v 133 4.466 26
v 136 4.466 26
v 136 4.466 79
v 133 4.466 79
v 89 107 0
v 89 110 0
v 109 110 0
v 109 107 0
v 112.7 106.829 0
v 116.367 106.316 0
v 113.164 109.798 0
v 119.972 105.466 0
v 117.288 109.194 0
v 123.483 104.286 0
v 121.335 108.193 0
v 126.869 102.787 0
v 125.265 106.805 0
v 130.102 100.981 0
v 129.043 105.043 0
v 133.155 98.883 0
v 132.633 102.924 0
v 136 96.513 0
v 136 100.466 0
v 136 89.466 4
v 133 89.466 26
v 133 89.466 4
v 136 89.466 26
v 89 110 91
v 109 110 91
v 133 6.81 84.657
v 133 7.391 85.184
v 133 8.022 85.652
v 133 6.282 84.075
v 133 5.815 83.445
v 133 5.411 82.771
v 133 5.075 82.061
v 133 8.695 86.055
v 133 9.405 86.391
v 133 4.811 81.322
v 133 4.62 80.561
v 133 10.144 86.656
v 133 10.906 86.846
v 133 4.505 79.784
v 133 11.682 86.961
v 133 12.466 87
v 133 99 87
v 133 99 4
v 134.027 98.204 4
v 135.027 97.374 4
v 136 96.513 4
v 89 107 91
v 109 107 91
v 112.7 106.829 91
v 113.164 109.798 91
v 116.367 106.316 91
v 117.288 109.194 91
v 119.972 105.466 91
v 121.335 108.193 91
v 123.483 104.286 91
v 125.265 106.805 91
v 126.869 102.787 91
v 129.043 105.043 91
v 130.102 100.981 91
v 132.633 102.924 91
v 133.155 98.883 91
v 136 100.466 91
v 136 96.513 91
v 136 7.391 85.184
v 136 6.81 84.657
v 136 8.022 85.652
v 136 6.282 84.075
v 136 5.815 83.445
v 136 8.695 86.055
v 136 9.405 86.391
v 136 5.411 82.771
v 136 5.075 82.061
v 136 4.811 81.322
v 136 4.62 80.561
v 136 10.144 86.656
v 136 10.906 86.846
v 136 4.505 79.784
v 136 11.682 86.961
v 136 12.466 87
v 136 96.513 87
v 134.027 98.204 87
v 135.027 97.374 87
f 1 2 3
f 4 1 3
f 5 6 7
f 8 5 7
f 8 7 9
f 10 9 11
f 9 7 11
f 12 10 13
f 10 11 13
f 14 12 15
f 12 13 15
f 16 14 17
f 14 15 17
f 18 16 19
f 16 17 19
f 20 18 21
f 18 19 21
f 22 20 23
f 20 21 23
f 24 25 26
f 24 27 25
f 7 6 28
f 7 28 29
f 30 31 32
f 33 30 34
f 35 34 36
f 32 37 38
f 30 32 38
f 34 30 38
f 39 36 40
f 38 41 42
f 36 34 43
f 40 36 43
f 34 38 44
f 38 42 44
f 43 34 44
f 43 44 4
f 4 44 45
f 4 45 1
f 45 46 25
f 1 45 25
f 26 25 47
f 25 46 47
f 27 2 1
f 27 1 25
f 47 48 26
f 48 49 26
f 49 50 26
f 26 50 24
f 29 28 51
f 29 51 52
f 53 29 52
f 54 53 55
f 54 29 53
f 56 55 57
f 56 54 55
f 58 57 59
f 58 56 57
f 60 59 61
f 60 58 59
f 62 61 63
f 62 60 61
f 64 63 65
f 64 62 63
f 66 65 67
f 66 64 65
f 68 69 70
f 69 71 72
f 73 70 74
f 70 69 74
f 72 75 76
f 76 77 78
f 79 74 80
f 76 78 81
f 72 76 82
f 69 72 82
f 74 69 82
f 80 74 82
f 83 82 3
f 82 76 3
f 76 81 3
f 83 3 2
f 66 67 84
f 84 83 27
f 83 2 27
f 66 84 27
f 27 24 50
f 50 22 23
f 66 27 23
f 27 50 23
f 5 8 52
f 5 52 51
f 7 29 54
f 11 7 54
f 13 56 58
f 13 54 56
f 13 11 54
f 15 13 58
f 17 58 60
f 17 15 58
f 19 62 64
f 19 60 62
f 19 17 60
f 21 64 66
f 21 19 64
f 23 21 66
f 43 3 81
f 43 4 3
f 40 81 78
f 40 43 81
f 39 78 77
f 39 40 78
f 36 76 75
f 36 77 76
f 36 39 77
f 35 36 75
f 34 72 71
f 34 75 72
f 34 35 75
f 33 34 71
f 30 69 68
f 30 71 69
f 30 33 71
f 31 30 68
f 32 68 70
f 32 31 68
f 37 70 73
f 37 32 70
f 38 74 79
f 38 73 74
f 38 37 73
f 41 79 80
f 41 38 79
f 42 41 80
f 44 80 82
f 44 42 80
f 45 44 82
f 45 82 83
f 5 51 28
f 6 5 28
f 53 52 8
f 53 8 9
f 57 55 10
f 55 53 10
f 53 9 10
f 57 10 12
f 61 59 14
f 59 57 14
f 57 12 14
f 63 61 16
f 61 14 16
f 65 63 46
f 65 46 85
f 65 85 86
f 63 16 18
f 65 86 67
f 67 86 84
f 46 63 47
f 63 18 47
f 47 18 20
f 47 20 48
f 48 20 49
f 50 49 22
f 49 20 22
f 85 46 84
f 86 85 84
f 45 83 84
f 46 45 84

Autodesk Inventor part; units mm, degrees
ref_plane "YZ Plane" through (0, 0, 0) normal (1, 0, 0) x (0, 1, 0)
ref_plane "XZ Plane" through (0, 0, 0) normal (0, 1, 0) x (-1, 0, 0)
ref_plane "XY Plane" through (0, 0, 0) normal (0, 0, 1) x (1, 0, 0)
sketch "Sketch1" plane through (0, 0, 0) normal (0, 0, 1) x (1, 0, 0)
  arc A0 (136, 96.5127) -> (109, 107) centre (109, 67) ccw
  line L0 (149, 0) -> (149, 67)
  line L1 (109, 107) -> (89, 107)
  line L2 (149, 0) -> (136, 0)
  line L3 (136, 0) -> (136, 112.2002)
  line L4 (89, 110) -> (109, 110)
  arc A1 (136, 100.4664) -> (109, 110) centre (109, 67) ccw
  line L5 (89, 107) -> (89, 110)
  point P0 (0, 0)
  point P1 (0, 53.5)
  dimension "d0" = 13
  dimension "d1" = 3
extrude "Extrusion1" add sketch "Sketch1" along normal blind 91
sketch "Sketch2" plane through (136, 96.5127, 0) normal (1, 0, 0) x (0, 0, -1)
  line L0 (0, 3.9537) -> (-91, 3.9537) projected
  line L1 (-87, 3.9537) -> (-4, 3.9537)
  line L2 (-4, 3.9537) -> (-4, -92.0463)
  line L3 (-4, -92.0463) -> (-87, -92.0463)
  line L4 (-87, -92.0463) -> (-87, 3.9537)
  line L5 (-91, 0) -> (-91, 3.9537) projected
  point P0 (0, -96.5127)
  point P1 (-4, 3.9537)
  dimension "d4" = 83
  dimension "d5" = 96
  dimension "d6" = 4
extrude "Extrusion2" add sketch "Sketch2" against normal blind 3
fillet "Fillet1" radius 8 1 edges at (134.5, 4.4664, 87)
sketch "Sketch3" plane through (136, 96.5127, 0) normal (1, 0, 0) x (0, 0, -1)
  line L0 (-79, -92.0463) -> (-4, -92.0463) projected
  line L1 (-4, -92.0463) -> (-26, -92.0463)
  line L2 (-26, -92.0463) -> (-26, -7.0463)
  line L3 (-26, -7.0463) -> (-4, -7.0463)
  line L4 (-4, -7.0463) -> (-4, -92.0463)
  point P0 (0, -96.5127)
  dimension "d10" = 22
  dimension "d11" = 85
extrude "Extrusion3" cut sketch "Sketch3" against normal up to surface (3 mm away)
properties part number "obudowa przekładni 3 LEFT"
